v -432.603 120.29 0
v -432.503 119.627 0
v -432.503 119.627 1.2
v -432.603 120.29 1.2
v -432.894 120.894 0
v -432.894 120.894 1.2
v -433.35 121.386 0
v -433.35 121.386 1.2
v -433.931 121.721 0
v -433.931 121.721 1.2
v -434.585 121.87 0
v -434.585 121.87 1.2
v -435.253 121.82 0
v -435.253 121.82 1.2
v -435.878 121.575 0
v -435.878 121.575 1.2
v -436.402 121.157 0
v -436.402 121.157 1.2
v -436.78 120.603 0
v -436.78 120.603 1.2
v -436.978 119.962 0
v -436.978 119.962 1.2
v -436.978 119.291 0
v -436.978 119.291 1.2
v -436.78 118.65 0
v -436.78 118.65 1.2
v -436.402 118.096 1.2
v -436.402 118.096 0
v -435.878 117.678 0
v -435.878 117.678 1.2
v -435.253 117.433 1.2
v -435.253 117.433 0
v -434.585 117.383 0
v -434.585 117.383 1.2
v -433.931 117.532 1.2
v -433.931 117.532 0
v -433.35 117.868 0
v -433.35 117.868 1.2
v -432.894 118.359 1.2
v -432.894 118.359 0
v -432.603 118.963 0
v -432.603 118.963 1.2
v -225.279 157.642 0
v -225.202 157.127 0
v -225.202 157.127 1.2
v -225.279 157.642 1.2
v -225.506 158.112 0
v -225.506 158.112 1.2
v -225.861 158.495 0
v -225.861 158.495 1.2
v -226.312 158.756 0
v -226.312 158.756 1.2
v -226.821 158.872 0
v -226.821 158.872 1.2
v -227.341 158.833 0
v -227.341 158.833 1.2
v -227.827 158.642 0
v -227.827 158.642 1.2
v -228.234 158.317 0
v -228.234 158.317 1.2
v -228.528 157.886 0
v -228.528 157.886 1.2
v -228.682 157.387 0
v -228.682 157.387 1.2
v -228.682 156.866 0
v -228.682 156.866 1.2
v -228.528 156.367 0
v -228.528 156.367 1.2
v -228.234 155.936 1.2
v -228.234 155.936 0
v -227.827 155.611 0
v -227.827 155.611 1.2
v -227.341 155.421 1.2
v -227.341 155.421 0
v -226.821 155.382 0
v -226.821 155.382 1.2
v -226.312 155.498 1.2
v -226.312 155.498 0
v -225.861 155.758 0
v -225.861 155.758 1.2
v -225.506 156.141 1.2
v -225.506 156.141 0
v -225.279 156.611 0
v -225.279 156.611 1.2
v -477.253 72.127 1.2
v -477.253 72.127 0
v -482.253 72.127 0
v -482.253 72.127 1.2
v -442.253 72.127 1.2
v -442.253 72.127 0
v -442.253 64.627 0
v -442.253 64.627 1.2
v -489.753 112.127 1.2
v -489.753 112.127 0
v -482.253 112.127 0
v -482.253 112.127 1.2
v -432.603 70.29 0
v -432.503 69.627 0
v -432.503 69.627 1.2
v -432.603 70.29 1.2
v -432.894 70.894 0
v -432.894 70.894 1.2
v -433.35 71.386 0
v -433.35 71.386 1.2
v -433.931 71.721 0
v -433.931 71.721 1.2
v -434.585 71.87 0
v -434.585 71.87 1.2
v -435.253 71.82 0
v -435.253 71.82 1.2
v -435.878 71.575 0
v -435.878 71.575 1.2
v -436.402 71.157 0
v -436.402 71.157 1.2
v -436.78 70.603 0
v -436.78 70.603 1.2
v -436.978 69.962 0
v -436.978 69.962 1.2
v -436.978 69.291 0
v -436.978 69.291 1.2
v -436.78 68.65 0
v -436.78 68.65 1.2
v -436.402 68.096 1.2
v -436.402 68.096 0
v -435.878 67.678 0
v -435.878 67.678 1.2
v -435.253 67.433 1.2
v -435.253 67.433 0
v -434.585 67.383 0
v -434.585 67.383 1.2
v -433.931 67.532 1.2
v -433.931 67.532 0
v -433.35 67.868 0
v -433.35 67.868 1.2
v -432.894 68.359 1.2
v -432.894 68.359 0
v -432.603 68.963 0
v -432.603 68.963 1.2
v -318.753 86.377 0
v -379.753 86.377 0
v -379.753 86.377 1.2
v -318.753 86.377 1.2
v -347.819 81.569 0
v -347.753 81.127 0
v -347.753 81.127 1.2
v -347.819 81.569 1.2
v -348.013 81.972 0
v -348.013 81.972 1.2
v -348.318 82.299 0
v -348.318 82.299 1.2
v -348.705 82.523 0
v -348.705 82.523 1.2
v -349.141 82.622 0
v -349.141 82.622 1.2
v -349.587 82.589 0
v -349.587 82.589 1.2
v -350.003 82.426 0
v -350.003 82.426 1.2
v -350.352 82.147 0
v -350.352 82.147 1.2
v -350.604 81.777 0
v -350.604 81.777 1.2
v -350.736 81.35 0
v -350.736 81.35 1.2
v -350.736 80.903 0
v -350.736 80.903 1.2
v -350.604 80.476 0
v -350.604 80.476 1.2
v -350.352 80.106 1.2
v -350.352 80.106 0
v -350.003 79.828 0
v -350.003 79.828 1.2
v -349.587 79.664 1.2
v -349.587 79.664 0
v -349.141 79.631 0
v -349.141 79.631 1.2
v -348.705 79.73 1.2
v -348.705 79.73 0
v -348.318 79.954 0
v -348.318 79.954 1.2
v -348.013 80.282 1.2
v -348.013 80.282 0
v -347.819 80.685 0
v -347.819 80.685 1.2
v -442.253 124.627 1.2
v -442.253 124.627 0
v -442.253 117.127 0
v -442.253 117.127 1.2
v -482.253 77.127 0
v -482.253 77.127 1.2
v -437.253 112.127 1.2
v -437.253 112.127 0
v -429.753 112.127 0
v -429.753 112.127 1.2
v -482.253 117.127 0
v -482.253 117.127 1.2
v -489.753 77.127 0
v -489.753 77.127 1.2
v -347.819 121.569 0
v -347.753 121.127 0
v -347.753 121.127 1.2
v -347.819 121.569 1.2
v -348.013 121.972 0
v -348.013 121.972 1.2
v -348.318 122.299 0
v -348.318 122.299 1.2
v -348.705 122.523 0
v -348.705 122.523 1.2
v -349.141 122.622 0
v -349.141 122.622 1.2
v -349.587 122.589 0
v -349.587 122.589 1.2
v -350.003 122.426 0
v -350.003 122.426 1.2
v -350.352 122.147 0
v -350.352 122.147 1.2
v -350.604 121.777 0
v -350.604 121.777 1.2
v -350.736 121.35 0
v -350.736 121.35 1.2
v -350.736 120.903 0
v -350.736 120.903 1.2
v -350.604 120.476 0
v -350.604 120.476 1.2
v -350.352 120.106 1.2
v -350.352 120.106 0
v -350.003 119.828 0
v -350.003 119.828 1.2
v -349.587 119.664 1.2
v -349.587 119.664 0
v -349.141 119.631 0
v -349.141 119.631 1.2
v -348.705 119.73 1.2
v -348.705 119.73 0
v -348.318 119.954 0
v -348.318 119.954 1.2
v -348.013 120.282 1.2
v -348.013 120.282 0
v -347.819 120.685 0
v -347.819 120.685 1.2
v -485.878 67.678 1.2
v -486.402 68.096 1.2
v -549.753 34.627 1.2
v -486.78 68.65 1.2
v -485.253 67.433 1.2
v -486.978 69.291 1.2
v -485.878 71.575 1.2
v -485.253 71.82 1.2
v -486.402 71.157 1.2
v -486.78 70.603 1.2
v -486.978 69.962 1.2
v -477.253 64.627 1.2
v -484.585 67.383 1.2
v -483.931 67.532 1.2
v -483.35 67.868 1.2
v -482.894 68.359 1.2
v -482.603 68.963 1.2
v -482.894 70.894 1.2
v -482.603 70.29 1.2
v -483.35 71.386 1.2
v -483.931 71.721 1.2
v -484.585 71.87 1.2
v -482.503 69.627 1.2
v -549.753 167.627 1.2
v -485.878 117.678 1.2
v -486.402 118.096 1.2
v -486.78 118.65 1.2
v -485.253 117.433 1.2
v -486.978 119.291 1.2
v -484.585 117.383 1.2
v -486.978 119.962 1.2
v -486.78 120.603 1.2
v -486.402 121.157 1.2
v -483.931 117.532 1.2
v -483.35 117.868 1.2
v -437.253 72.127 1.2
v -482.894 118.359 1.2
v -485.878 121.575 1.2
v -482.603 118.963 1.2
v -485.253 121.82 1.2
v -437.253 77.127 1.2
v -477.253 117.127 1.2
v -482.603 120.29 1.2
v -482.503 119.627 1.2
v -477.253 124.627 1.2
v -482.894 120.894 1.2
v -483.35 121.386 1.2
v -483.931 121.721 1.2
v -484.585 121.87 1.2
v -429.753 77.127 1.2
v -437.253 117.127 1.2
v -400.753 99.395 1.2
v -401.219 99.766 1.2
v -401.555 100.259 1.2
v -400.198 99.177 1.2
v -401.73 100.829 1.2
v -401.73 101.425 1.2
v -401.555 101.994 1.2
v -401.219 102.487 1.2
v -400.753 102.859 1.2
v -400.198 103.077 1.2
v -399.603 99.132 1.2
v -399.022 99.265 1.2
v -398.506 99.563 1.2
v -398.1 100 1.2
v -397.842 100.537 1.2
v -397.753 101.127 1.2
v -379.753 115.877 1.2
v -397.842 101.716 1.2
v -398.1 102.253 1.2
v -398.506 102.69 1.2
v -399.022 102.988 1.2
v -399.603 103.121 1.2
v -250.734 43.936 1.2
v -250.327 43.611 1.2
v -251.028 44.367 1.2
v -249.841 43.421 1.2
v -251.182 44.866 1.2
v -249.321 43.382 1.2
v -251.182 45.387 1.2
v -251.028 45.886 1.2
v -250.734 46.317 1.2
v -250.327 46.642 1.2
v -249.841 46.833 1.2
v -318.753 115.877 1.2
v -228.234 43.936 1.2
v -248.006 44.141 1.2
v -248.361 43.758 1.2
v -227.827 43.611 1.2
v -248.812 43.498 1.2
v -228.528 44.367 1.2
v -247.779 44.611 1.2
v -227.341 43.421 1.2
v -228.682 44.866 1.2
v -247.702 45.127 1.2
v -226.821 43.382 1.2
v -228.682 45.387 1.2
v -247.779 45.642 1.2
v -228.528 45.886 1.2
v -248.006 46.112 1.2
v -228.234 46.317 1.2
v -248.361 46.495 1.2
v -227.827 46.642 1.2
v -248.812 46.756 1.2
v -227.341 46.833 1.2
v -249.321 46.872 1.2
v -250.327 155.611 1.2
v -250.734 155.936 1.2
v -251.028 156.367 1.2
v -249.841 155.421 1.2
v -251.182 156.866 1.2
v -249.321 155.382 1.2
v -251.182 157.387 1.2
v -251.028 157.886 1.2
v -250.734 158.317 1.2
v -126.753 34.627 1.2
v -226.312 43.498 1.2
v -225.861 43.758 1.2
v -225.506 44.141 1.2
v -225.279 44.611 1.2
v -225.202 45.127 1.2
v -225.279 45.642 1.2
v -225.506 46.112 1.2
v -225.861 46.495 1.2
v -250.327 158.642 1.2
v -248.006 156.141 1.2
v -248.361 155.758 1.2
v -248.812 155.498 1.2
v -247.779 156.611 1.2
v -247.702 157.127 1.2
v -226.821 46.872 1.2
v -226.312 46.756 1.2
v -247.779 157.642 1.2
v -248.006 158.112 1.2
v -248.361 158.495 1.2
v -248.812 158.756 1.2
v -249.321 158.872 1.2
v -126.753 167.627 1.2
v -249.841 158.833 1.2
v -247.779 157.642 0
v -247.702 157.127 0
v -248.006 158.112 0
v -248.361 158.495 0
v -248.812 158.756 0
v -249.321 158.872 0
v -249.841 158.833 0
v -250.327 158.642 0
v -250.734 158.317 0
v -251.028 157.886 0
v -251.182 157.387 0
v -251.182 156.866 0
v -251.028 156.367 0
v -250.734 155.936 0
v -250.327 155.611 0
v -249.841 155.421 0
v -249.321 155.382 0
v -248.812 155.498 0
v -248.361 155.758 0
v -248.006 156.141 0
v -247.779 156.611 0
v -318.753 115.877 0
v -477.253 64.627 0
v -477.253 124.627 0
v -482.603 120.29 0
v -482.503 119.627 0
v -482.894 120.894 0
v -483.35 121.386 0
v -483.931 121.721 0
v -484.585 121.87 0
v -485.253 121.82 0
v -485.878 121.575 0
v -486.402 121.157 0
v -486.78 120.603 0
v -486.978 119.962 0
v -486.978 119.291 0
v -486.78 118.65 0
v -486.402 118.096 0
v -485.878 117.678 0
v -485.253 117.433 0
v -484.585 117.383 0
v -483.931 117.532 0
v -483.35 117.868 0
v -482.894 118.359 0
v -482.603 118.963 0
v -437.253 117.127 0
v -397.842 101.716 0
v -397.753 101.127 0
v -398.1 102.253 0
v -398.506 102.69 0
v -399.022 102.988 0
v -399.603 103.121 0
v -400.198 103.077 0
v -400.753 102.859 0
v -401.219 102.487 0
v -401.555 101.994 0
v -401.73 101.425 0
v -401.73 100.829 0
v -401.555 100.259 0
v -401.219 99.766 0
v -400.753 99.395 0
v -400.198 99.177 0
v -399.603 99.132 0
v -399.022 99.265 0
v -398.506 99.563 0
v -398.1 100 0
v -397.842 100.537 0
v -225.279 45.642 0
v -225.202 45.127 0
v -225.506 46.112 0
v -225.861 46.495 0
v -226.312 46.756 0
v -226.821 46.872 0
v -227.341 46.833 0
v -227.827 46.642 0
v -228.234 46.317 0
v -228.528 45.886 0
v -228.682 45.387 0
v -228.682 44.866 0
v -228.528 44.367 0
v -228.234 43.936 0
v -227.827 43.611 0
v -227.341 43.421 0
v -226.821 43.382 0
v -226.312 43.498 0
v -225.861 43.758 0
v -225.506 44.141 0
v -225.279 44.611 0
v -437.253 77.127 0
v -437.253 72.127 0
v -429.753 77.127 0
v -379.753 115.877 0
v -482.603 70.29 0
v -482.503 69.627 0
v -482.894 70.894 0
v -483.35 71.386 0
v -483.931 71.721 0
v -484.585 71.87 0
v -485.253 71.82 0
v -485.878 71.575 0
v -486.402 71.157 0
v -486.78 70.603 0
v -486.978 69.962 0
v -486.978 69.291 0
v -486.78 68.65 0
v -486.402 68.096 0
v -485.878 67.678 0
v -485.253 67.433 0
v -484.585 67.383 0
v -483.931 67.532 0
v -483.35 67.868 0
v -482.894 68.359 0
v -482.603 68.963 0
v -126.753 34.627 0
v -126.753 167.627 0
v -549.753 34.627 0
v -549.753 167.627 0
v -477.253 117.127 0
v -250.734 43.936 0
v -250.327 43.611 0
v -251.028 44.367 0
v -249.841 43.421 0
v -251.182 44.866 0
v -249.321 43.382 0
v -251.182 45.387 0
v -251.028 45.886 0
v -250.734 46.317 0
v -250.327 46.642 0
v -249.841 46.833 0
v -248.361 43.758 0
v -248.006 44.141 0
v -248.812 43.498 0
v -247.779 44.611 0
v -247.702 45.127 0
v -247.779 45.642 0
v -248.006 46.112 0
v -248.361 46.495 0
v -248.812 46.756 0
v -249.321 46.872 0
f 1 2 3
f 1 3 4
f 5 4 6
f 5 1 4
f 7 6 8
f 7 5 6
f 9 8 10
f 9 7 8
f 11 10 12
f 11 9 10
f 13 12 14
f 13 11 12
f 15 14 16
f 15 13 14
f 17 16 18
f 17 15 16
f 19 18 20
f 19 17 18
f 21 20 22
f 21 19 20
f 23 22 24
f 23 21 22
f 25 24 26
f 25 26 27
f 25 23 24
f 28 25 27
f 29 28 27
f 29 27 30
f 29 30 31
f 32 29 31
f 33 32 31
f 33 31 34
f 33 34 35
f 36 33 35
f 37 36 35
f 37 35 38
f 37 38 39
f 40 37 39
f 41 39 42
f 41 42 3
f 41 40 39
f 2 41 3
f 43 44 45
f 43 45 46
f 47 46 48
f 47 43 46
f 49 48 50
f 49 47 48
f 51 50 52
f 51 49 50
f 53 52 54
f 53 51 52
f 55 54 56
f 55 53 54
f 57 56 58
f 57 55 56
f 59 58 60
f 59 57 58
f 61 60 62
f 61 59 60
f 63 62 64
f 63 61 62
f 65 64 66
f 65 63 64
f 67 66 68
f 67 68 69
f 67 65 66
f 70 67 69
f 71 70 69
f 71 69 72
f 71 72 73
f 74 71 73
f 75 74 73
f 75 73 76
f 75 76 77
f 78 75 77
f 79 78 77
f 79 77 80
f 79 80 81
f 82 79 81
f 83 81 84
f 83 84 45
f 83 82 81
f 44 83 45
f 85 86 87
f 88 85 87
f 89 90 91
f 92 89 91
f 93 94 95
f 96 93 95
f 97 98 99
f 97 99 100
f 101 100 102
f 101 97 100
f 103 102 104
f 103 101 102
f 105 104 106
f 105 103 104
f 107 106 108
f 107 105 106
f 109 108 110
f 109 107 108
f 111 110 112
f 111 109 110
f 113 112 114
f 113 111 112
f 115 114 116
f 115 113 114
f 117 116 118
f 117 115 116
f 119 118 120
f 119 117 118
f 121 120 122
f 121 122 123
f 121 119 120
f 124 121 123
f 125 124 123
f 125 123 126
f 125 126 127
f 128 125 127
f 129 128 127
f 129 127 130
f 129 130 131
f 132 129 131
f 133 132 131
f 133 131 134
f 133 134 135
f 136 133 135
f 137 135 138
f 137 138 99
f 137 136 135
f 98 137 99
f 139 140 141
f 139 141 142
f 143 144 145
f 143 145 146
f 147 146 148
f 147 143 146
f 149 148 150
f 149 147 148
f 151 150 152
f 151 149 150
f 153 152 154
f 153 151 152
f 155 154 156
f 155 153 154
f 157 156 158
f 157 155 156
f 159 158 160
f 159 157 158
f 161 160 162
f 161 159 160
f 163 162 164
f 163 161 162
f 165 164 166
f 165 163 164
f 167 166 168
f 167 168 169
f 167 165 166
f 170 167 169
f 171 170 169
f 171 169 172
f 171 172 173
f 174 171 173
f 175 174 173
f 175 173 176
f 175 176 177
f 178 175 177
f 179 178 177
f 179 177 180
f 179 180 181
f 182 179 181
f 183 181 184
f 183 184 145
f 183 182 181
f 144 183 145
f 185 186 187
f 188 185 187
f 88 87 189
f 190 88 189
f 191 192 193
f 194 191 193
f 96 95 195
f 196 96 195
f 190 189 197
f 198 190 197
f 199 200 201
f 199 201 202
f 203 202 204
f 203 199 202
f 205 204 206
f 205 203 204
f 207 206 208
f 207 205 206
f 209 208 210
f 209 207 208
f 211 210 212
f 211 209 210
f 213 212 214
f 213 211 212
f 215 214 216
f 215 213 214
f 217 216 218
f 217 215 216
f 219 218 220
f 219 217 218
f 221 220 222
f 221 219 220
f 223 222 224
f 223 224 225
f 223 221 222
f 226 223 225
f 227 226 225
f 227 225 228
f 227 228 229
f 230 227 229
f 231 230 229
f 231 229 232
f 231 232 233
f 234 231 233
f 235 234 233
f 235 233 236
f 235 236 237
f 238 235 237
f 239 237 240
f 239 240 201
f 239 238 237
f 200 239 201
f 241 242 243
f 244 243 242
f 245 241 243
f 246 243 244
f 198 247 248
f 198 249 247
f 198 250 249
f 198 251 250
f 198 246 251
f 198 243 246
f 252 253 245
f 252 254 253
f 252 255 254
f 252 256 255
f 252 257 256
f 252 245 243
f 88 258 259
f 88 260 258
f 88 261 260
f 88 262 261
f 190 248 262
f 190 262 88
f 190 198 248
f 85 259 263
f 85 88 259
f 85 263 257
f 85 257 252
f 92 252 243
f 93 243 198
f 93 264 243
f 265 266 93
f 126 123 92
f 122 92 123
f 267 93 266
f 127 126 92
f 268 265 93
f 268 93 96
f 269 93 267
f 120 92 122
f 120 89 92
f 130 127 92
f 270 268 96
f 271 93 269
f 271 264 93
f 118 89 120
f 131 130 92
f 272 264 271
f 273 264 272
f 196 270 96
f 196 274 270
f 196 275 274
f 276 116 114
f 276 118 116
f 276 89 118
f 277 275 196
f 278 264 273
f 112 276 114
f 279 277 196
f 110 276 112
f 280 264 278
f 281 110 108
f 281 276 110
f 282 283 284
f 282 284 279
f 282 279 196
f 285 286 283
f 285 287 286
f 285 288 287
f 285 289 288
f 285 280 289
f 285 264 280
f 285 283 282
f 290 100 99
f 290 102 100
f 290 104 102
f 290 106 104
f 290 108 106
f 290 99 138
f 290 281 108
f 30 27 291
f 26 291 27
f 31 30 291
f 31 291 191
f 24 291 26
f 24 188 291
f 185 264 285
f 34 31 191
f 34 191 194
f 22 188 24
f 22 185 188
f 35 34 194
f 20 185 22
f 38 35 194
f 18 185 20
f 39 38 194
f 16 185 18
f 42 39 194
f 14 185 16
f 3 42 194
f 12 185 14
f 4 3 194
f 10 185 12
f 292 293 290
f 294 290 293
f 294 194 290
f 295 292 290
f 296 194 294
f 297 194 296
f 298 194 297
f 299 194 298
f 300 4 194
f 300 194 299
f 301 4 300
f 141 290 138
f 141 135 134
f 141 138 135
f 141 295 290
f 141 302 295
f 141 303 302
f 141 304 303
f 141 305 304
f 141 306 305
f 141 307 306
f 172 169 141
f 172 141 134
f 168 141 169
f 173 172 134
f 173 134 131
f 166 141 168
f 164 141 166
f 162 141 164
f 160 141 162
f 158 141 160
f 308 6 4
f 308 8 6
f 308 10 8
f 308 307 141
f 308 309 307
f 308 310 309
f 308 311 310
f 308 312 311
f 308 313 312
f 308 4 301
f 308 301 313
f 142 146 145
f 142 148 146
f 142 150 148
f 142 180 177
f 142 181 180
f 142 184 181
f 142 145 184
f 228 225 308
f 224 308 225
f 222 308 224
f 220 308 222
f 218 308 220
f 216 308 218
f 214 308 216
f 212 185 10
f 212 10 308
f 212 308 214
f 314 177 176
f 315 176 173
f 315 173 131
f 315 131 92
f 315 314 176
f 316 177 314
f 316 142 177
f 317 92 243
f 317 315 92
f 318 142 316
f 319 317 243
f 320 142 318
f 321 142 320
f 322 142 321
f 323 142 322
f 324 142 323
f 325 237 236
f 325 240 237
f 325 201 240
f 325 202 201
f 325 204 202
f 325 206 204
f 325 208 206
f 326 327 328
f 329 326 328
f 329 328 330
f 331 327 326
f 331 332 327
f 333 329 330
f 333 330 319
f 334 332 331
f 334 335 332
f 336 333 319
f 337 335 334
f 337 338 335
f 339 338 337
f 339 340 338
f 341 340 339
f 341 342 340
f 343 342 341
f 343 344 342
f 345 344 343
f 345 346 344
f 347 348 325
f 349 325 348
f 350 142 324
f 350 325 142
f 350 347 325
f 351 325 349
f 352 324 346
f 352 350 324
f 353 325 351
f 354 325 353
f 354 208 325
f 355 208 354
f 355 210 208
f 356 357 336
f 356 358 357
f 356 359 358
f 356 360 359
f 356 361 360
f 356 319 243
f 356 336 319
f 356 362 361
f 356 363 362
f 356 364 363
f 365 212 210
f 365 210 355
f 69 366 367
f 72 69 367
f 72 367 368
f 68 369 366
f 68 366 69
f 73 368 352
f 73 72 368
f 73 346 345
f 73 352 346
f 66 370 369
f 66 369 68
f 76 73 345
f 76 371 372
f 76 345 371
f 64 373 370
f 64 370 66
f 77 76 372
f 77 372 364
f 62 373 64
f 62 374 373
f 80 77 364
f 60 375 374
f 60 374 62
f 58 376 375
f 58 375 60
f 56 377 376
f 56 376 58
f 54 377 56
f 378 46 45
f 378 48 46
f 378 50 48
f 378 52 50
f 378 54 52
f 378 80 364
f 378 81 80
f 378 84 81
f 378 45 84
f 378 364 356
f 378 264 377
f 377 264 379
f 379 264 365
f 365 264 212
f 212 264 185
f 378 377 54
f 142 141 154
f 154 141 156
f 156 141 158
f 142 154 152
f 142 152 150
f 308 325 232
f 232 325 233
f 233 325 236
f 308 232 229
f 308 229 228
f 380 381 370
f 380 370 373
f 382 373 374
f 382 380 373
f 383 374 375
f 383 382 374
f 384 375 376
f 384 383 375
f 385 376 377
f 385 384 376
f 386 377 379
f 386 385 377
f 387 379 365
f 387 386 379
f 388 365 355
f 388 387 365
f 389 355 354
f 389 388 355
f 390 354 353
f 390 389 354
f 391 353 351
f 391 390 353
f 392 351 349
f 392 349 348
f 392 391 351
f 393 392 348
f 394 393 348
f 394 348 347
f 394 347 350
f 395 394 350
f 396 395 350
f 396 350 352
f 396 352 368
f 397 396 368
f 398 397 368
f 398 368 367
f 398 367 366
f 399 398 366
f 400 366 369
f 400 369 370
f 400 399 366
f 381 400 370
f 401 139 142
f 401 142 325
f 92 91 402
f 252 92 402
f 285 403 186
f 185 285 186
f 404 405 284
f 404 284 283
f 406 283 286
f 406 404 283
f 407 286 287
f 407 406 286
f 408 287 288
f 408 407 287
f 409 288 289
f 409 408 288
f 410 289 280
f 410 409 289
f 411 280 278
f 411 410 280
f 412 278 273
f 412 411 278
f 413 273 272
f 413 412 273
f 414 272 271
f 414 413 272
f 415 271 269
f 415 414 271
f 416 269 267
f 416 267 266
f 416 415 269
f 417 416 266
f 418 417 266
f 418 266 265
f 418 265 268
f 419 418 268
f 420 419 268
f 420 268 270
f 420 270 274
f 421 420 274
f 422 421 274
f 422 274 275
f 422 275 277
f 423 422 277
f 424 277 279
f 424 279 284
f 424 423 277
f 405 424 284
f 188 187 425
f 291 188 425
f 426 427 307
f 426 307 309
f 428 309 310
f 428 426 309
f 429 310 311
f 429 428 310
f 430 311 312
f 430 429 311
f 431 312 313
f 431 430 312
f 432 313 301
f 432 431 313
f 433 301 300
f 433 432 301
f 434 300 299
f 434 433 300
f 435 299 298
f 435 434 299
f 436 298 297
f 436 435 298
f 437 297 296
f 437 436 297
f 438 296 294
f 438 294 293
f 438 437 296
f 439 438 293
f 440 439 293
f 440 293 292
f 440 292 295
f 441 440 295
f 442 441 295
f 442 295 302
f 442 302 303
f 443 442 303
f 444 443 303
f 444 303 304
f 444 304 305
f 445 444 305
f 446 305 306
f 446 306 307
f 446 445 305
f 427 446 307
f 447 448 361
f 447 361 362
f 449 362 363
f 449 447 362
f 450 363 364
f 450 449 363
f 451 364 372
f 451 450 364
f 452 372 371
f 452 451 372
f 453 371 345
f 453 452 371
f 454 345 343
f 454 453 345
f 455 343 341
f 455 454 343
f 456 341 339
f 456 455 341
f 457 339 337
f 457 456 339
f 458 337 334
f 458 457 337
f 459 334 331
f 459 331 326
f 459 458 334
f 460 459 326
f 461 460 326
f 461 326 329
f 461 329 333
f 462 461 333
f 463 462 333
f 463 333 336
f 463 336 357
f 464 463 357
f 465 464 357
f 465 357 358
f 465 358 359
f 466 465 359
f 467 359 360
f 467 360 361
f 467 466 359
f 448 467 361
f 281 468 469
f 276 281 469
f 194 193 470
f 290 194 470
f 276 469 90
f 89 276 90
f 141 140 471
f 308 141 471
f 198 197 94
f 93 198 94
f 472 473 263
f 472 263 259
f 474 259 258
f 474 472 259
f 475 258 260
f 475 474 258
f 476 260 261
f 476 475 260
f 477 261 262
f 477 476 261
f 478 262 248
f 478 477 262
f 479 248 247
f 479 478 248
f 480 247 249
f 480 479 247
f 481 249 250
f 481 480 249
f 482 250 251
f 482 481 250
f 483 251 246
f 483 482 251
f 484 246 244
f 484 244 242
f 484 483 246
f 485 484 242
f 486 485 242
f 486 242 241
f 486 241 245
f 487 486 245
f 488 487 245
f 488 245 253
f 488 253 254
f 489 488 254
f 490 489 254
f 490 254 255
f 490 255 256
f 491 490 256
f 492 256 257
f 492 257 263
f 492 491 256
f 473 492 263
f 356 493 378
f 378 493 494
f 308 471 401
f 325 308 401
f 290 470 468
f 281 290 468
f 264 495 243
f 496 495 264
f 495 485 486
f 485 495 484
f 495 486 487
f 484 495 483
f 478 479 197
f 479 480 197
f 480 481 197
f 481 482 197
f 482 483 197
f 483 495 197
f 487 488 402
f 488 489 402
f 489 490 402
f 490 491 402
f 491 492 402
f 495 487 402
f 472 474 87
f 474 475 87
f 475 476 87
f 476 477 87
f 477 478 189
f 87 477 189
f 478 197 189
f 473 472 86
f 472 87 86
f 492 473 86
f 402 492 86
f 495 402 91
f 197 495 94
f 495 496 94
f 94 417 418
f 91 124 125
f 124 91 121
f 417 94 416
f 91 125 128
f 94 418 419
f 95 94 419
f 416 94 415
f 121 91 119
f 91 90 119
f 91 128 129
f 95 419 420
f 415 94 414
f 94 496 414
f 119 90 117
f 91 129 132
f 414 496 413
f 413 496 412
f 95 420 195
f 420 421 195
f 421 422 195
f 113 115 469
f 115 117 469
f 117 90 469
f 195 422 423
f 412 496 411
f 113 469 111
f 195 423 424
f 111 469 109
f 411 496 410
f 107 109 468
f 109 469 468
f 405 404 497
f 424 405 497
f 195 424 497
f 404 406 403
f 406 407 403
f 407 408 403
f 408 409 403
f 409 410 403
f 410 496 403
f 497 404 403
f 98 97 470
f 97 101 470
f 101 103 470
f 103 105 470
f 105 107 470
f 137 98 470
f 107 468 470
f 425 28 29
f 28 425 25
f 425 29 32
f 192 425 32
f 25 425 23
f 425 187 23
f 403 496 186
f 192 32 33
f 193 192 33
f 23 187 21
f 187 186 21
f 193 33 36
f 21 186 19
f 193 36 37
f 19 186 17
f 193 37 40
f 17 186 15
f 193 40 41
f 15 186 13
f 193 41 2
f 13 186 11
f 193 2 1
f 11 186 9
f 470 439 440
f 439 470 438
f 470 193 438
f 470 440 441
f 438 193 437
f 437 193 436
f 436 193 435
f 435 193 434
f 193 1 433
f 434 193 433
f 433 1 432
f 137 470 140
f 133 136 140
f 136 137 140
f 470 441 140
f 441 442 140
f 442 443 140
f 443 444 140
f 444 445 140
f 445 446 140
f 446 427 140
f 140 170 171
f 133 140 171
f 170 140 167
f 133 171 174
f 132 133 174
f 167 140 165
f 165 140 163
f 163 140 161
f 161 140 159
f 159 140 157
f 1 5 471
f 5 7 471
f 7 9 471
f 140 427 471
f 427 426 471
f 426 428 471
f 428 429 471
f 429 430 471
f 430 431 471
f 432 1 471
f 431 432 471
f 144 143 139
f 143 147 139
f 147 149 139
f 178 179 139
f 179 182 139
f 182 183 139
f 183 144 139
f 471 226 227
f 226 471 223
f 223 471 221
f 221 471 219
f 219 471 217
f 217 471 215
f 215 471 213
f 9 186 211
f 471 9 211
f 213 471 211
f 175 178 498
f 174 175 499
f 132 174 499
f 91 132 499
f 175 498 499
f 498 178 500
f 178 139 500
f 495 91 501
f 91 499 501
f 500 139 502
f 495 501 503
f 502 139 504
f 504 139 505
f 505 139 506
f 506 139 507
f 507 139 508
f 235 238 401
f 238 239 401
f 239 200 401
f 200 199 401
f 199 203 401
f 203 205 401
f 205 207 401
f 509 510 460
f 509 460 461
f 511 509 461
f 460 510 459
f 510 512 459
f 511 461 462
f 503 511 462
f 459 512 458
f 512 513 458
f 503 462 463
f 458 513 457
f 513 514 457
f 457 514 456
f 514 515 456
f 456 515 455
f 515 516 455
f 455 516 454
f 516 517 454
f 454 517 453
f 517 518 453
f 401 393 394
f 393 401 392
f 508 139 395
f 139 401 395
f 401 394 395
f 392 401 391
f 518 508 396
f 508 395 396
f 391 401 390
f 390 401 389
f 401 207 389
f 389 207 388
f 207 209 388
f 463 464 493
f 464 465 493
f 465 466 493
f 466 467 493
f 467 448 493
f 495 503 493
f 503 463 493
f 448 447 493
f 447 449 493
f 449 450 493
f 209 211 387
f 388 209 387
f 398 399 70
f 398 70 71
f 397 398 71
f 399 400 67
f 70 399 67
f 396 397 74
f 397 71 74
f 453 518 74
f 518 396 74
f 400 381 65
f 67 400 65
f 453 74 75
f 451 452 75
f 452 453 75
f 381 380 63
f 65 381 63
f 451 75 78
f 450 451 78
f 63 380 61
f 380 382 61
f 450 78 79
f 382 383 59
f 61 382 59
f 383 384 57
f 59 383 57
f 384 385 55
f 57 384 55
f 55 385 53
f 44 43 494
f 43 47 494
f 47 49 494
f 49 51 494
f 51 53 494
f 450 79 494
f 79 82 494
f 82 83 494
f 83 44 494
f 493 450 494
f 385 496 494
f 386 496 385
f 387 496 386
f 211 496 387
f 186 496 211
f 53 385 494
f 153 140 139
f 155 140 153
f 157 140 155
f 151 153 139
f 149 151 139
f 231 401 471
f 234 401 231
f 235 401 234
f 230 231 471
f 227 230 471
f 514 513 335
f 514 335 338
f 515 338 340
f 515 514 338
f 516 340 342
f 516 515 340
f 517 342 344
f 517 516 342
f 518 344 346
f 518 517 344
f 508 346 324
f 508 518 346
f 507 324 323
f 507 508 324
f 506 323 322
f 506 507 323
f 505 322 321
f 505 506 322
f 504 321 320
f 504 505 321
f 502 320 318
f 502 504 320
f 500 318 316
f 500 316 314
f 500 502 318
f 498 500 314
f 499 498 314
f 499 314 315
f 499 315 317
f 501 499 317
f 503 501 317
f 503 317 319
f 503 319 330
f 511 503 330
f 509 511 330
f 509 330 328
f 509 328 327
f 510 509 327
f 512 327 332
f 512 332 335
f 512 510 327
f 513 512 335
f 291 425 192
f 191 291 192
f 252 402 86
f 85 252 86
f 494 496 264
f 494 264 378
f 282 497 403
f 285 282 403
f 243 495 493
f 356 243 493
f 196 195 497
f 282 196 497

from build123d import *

# Parameters (mm, degrees)
ESQUISSE1_W        = 423
ESQUISSE1_H        = 133
ESQUISSE1_R        = 2.25
ESQUISSE1_R_2      = 1.5
ESQUISSE1_W_2      = 61
ESQUISSE1_H_2      = 29.5
ESQUISSE1_R_3      = 1.75
ESQUISSE1_R_4      = 2
BOSS_EXTRU_1_DEPTH = 1.2


with BuildPart() as part:
    # Esquisse1 → Boss.-Extru.1 (new body)
    with BuildSketch(Plane.XY):
        with Locations((-338.252753452, 101.126670585)):
            Rectangle(ESQUISSE1_W, ESQUISSE1_H)
        with Locations((-484.752753452, 69.626670585)):
            Circle(ESQUISSE1_R, mode=Mode.SUBTRACT)
        Polygon((-482.252753452, 112.126670585), (-482.252753452, 117.126670585), (-477.252753452, 117.126670585), (-477.252753452, 124.626670585), (-442.252753452, 124.626670585), (-442.252753452, 117.126670585), (-437.252753452, 117.126670585), (-437.252753452, 112.126670585), (-429.752753452, 112.126670585), (-429.752753452, 77.126670585), (-437.252753452, 77.126670585), (-437.252753452, 72.126670585), (-442.252753452, 72.126670585), (-442.252753452, 64.626670585), (-477.252753452, 64.626670585), (-477.252753452, 72.126670585), (-482.252753452, 72.126670585), (-482.252753452, 77.126670585), (-489.752753452, 77.126670585), (-489.752753452, 112.126670585), align=None, mode=Mode.SUBTRACT)
        with Locations((-434.752753452, 69.626670585)):
            Circle(ESQUISSE1_R, mode=Mode.SUBTRACT)
        with Locations((-349.252753452, 81.126670585)):
            Circle(ESQUISSE1_R_2, mode=Mode.SUBTRACT)
        with Locations((-349.252753452, 101.126670585)):
            Rectangle(ESQUISSE1_W_2, ESQUISSE1_H_2, mode=Mode.SUBTRACT)
        with Locations((-249.451641066, 45.126670585)):
            Circle(ESQUISSE1_R_3, mode=Mode.SUBTRACT)
        with Locations((-226.951641066, 45.126670585)):
            Circle(ESQUISSE1_R_3, mode=Mode.SUBTRACT)
        with Locations((-484.752753452, 119.626670585)):
            Circle(ESQUISSE1_R, mode=Mode.SUBTRACT)
        with Locations((-399.752753452, 101.126670585)):
            Circle(ESQUISSE1_R_4, mode=Mode.SUBTRACT)
        with Locations((-434.752753452, 119.626670585)):
            Circle(ESQUISSE1_R, mode=Mode.SUBTRACT)
        with Locations((-349.252753452, 121.126670585)):
            Circle(ESQUISSE1_R_2, mode=Mode.SUBTRACT)
        with Locations((-249.451641066, 157.126670585)):
            Circle(ESQUISSE1_R_3, mode=Mode.SUBTRACT)
        with Locations((-226.951641066, 157.126670585)):
            Circle(ESQUISSE1_R_3, mode=Mode.SUBTRACT)
    extrude(amount=BOSS_EXTRU_1_DEPTH)


solid = part.part
